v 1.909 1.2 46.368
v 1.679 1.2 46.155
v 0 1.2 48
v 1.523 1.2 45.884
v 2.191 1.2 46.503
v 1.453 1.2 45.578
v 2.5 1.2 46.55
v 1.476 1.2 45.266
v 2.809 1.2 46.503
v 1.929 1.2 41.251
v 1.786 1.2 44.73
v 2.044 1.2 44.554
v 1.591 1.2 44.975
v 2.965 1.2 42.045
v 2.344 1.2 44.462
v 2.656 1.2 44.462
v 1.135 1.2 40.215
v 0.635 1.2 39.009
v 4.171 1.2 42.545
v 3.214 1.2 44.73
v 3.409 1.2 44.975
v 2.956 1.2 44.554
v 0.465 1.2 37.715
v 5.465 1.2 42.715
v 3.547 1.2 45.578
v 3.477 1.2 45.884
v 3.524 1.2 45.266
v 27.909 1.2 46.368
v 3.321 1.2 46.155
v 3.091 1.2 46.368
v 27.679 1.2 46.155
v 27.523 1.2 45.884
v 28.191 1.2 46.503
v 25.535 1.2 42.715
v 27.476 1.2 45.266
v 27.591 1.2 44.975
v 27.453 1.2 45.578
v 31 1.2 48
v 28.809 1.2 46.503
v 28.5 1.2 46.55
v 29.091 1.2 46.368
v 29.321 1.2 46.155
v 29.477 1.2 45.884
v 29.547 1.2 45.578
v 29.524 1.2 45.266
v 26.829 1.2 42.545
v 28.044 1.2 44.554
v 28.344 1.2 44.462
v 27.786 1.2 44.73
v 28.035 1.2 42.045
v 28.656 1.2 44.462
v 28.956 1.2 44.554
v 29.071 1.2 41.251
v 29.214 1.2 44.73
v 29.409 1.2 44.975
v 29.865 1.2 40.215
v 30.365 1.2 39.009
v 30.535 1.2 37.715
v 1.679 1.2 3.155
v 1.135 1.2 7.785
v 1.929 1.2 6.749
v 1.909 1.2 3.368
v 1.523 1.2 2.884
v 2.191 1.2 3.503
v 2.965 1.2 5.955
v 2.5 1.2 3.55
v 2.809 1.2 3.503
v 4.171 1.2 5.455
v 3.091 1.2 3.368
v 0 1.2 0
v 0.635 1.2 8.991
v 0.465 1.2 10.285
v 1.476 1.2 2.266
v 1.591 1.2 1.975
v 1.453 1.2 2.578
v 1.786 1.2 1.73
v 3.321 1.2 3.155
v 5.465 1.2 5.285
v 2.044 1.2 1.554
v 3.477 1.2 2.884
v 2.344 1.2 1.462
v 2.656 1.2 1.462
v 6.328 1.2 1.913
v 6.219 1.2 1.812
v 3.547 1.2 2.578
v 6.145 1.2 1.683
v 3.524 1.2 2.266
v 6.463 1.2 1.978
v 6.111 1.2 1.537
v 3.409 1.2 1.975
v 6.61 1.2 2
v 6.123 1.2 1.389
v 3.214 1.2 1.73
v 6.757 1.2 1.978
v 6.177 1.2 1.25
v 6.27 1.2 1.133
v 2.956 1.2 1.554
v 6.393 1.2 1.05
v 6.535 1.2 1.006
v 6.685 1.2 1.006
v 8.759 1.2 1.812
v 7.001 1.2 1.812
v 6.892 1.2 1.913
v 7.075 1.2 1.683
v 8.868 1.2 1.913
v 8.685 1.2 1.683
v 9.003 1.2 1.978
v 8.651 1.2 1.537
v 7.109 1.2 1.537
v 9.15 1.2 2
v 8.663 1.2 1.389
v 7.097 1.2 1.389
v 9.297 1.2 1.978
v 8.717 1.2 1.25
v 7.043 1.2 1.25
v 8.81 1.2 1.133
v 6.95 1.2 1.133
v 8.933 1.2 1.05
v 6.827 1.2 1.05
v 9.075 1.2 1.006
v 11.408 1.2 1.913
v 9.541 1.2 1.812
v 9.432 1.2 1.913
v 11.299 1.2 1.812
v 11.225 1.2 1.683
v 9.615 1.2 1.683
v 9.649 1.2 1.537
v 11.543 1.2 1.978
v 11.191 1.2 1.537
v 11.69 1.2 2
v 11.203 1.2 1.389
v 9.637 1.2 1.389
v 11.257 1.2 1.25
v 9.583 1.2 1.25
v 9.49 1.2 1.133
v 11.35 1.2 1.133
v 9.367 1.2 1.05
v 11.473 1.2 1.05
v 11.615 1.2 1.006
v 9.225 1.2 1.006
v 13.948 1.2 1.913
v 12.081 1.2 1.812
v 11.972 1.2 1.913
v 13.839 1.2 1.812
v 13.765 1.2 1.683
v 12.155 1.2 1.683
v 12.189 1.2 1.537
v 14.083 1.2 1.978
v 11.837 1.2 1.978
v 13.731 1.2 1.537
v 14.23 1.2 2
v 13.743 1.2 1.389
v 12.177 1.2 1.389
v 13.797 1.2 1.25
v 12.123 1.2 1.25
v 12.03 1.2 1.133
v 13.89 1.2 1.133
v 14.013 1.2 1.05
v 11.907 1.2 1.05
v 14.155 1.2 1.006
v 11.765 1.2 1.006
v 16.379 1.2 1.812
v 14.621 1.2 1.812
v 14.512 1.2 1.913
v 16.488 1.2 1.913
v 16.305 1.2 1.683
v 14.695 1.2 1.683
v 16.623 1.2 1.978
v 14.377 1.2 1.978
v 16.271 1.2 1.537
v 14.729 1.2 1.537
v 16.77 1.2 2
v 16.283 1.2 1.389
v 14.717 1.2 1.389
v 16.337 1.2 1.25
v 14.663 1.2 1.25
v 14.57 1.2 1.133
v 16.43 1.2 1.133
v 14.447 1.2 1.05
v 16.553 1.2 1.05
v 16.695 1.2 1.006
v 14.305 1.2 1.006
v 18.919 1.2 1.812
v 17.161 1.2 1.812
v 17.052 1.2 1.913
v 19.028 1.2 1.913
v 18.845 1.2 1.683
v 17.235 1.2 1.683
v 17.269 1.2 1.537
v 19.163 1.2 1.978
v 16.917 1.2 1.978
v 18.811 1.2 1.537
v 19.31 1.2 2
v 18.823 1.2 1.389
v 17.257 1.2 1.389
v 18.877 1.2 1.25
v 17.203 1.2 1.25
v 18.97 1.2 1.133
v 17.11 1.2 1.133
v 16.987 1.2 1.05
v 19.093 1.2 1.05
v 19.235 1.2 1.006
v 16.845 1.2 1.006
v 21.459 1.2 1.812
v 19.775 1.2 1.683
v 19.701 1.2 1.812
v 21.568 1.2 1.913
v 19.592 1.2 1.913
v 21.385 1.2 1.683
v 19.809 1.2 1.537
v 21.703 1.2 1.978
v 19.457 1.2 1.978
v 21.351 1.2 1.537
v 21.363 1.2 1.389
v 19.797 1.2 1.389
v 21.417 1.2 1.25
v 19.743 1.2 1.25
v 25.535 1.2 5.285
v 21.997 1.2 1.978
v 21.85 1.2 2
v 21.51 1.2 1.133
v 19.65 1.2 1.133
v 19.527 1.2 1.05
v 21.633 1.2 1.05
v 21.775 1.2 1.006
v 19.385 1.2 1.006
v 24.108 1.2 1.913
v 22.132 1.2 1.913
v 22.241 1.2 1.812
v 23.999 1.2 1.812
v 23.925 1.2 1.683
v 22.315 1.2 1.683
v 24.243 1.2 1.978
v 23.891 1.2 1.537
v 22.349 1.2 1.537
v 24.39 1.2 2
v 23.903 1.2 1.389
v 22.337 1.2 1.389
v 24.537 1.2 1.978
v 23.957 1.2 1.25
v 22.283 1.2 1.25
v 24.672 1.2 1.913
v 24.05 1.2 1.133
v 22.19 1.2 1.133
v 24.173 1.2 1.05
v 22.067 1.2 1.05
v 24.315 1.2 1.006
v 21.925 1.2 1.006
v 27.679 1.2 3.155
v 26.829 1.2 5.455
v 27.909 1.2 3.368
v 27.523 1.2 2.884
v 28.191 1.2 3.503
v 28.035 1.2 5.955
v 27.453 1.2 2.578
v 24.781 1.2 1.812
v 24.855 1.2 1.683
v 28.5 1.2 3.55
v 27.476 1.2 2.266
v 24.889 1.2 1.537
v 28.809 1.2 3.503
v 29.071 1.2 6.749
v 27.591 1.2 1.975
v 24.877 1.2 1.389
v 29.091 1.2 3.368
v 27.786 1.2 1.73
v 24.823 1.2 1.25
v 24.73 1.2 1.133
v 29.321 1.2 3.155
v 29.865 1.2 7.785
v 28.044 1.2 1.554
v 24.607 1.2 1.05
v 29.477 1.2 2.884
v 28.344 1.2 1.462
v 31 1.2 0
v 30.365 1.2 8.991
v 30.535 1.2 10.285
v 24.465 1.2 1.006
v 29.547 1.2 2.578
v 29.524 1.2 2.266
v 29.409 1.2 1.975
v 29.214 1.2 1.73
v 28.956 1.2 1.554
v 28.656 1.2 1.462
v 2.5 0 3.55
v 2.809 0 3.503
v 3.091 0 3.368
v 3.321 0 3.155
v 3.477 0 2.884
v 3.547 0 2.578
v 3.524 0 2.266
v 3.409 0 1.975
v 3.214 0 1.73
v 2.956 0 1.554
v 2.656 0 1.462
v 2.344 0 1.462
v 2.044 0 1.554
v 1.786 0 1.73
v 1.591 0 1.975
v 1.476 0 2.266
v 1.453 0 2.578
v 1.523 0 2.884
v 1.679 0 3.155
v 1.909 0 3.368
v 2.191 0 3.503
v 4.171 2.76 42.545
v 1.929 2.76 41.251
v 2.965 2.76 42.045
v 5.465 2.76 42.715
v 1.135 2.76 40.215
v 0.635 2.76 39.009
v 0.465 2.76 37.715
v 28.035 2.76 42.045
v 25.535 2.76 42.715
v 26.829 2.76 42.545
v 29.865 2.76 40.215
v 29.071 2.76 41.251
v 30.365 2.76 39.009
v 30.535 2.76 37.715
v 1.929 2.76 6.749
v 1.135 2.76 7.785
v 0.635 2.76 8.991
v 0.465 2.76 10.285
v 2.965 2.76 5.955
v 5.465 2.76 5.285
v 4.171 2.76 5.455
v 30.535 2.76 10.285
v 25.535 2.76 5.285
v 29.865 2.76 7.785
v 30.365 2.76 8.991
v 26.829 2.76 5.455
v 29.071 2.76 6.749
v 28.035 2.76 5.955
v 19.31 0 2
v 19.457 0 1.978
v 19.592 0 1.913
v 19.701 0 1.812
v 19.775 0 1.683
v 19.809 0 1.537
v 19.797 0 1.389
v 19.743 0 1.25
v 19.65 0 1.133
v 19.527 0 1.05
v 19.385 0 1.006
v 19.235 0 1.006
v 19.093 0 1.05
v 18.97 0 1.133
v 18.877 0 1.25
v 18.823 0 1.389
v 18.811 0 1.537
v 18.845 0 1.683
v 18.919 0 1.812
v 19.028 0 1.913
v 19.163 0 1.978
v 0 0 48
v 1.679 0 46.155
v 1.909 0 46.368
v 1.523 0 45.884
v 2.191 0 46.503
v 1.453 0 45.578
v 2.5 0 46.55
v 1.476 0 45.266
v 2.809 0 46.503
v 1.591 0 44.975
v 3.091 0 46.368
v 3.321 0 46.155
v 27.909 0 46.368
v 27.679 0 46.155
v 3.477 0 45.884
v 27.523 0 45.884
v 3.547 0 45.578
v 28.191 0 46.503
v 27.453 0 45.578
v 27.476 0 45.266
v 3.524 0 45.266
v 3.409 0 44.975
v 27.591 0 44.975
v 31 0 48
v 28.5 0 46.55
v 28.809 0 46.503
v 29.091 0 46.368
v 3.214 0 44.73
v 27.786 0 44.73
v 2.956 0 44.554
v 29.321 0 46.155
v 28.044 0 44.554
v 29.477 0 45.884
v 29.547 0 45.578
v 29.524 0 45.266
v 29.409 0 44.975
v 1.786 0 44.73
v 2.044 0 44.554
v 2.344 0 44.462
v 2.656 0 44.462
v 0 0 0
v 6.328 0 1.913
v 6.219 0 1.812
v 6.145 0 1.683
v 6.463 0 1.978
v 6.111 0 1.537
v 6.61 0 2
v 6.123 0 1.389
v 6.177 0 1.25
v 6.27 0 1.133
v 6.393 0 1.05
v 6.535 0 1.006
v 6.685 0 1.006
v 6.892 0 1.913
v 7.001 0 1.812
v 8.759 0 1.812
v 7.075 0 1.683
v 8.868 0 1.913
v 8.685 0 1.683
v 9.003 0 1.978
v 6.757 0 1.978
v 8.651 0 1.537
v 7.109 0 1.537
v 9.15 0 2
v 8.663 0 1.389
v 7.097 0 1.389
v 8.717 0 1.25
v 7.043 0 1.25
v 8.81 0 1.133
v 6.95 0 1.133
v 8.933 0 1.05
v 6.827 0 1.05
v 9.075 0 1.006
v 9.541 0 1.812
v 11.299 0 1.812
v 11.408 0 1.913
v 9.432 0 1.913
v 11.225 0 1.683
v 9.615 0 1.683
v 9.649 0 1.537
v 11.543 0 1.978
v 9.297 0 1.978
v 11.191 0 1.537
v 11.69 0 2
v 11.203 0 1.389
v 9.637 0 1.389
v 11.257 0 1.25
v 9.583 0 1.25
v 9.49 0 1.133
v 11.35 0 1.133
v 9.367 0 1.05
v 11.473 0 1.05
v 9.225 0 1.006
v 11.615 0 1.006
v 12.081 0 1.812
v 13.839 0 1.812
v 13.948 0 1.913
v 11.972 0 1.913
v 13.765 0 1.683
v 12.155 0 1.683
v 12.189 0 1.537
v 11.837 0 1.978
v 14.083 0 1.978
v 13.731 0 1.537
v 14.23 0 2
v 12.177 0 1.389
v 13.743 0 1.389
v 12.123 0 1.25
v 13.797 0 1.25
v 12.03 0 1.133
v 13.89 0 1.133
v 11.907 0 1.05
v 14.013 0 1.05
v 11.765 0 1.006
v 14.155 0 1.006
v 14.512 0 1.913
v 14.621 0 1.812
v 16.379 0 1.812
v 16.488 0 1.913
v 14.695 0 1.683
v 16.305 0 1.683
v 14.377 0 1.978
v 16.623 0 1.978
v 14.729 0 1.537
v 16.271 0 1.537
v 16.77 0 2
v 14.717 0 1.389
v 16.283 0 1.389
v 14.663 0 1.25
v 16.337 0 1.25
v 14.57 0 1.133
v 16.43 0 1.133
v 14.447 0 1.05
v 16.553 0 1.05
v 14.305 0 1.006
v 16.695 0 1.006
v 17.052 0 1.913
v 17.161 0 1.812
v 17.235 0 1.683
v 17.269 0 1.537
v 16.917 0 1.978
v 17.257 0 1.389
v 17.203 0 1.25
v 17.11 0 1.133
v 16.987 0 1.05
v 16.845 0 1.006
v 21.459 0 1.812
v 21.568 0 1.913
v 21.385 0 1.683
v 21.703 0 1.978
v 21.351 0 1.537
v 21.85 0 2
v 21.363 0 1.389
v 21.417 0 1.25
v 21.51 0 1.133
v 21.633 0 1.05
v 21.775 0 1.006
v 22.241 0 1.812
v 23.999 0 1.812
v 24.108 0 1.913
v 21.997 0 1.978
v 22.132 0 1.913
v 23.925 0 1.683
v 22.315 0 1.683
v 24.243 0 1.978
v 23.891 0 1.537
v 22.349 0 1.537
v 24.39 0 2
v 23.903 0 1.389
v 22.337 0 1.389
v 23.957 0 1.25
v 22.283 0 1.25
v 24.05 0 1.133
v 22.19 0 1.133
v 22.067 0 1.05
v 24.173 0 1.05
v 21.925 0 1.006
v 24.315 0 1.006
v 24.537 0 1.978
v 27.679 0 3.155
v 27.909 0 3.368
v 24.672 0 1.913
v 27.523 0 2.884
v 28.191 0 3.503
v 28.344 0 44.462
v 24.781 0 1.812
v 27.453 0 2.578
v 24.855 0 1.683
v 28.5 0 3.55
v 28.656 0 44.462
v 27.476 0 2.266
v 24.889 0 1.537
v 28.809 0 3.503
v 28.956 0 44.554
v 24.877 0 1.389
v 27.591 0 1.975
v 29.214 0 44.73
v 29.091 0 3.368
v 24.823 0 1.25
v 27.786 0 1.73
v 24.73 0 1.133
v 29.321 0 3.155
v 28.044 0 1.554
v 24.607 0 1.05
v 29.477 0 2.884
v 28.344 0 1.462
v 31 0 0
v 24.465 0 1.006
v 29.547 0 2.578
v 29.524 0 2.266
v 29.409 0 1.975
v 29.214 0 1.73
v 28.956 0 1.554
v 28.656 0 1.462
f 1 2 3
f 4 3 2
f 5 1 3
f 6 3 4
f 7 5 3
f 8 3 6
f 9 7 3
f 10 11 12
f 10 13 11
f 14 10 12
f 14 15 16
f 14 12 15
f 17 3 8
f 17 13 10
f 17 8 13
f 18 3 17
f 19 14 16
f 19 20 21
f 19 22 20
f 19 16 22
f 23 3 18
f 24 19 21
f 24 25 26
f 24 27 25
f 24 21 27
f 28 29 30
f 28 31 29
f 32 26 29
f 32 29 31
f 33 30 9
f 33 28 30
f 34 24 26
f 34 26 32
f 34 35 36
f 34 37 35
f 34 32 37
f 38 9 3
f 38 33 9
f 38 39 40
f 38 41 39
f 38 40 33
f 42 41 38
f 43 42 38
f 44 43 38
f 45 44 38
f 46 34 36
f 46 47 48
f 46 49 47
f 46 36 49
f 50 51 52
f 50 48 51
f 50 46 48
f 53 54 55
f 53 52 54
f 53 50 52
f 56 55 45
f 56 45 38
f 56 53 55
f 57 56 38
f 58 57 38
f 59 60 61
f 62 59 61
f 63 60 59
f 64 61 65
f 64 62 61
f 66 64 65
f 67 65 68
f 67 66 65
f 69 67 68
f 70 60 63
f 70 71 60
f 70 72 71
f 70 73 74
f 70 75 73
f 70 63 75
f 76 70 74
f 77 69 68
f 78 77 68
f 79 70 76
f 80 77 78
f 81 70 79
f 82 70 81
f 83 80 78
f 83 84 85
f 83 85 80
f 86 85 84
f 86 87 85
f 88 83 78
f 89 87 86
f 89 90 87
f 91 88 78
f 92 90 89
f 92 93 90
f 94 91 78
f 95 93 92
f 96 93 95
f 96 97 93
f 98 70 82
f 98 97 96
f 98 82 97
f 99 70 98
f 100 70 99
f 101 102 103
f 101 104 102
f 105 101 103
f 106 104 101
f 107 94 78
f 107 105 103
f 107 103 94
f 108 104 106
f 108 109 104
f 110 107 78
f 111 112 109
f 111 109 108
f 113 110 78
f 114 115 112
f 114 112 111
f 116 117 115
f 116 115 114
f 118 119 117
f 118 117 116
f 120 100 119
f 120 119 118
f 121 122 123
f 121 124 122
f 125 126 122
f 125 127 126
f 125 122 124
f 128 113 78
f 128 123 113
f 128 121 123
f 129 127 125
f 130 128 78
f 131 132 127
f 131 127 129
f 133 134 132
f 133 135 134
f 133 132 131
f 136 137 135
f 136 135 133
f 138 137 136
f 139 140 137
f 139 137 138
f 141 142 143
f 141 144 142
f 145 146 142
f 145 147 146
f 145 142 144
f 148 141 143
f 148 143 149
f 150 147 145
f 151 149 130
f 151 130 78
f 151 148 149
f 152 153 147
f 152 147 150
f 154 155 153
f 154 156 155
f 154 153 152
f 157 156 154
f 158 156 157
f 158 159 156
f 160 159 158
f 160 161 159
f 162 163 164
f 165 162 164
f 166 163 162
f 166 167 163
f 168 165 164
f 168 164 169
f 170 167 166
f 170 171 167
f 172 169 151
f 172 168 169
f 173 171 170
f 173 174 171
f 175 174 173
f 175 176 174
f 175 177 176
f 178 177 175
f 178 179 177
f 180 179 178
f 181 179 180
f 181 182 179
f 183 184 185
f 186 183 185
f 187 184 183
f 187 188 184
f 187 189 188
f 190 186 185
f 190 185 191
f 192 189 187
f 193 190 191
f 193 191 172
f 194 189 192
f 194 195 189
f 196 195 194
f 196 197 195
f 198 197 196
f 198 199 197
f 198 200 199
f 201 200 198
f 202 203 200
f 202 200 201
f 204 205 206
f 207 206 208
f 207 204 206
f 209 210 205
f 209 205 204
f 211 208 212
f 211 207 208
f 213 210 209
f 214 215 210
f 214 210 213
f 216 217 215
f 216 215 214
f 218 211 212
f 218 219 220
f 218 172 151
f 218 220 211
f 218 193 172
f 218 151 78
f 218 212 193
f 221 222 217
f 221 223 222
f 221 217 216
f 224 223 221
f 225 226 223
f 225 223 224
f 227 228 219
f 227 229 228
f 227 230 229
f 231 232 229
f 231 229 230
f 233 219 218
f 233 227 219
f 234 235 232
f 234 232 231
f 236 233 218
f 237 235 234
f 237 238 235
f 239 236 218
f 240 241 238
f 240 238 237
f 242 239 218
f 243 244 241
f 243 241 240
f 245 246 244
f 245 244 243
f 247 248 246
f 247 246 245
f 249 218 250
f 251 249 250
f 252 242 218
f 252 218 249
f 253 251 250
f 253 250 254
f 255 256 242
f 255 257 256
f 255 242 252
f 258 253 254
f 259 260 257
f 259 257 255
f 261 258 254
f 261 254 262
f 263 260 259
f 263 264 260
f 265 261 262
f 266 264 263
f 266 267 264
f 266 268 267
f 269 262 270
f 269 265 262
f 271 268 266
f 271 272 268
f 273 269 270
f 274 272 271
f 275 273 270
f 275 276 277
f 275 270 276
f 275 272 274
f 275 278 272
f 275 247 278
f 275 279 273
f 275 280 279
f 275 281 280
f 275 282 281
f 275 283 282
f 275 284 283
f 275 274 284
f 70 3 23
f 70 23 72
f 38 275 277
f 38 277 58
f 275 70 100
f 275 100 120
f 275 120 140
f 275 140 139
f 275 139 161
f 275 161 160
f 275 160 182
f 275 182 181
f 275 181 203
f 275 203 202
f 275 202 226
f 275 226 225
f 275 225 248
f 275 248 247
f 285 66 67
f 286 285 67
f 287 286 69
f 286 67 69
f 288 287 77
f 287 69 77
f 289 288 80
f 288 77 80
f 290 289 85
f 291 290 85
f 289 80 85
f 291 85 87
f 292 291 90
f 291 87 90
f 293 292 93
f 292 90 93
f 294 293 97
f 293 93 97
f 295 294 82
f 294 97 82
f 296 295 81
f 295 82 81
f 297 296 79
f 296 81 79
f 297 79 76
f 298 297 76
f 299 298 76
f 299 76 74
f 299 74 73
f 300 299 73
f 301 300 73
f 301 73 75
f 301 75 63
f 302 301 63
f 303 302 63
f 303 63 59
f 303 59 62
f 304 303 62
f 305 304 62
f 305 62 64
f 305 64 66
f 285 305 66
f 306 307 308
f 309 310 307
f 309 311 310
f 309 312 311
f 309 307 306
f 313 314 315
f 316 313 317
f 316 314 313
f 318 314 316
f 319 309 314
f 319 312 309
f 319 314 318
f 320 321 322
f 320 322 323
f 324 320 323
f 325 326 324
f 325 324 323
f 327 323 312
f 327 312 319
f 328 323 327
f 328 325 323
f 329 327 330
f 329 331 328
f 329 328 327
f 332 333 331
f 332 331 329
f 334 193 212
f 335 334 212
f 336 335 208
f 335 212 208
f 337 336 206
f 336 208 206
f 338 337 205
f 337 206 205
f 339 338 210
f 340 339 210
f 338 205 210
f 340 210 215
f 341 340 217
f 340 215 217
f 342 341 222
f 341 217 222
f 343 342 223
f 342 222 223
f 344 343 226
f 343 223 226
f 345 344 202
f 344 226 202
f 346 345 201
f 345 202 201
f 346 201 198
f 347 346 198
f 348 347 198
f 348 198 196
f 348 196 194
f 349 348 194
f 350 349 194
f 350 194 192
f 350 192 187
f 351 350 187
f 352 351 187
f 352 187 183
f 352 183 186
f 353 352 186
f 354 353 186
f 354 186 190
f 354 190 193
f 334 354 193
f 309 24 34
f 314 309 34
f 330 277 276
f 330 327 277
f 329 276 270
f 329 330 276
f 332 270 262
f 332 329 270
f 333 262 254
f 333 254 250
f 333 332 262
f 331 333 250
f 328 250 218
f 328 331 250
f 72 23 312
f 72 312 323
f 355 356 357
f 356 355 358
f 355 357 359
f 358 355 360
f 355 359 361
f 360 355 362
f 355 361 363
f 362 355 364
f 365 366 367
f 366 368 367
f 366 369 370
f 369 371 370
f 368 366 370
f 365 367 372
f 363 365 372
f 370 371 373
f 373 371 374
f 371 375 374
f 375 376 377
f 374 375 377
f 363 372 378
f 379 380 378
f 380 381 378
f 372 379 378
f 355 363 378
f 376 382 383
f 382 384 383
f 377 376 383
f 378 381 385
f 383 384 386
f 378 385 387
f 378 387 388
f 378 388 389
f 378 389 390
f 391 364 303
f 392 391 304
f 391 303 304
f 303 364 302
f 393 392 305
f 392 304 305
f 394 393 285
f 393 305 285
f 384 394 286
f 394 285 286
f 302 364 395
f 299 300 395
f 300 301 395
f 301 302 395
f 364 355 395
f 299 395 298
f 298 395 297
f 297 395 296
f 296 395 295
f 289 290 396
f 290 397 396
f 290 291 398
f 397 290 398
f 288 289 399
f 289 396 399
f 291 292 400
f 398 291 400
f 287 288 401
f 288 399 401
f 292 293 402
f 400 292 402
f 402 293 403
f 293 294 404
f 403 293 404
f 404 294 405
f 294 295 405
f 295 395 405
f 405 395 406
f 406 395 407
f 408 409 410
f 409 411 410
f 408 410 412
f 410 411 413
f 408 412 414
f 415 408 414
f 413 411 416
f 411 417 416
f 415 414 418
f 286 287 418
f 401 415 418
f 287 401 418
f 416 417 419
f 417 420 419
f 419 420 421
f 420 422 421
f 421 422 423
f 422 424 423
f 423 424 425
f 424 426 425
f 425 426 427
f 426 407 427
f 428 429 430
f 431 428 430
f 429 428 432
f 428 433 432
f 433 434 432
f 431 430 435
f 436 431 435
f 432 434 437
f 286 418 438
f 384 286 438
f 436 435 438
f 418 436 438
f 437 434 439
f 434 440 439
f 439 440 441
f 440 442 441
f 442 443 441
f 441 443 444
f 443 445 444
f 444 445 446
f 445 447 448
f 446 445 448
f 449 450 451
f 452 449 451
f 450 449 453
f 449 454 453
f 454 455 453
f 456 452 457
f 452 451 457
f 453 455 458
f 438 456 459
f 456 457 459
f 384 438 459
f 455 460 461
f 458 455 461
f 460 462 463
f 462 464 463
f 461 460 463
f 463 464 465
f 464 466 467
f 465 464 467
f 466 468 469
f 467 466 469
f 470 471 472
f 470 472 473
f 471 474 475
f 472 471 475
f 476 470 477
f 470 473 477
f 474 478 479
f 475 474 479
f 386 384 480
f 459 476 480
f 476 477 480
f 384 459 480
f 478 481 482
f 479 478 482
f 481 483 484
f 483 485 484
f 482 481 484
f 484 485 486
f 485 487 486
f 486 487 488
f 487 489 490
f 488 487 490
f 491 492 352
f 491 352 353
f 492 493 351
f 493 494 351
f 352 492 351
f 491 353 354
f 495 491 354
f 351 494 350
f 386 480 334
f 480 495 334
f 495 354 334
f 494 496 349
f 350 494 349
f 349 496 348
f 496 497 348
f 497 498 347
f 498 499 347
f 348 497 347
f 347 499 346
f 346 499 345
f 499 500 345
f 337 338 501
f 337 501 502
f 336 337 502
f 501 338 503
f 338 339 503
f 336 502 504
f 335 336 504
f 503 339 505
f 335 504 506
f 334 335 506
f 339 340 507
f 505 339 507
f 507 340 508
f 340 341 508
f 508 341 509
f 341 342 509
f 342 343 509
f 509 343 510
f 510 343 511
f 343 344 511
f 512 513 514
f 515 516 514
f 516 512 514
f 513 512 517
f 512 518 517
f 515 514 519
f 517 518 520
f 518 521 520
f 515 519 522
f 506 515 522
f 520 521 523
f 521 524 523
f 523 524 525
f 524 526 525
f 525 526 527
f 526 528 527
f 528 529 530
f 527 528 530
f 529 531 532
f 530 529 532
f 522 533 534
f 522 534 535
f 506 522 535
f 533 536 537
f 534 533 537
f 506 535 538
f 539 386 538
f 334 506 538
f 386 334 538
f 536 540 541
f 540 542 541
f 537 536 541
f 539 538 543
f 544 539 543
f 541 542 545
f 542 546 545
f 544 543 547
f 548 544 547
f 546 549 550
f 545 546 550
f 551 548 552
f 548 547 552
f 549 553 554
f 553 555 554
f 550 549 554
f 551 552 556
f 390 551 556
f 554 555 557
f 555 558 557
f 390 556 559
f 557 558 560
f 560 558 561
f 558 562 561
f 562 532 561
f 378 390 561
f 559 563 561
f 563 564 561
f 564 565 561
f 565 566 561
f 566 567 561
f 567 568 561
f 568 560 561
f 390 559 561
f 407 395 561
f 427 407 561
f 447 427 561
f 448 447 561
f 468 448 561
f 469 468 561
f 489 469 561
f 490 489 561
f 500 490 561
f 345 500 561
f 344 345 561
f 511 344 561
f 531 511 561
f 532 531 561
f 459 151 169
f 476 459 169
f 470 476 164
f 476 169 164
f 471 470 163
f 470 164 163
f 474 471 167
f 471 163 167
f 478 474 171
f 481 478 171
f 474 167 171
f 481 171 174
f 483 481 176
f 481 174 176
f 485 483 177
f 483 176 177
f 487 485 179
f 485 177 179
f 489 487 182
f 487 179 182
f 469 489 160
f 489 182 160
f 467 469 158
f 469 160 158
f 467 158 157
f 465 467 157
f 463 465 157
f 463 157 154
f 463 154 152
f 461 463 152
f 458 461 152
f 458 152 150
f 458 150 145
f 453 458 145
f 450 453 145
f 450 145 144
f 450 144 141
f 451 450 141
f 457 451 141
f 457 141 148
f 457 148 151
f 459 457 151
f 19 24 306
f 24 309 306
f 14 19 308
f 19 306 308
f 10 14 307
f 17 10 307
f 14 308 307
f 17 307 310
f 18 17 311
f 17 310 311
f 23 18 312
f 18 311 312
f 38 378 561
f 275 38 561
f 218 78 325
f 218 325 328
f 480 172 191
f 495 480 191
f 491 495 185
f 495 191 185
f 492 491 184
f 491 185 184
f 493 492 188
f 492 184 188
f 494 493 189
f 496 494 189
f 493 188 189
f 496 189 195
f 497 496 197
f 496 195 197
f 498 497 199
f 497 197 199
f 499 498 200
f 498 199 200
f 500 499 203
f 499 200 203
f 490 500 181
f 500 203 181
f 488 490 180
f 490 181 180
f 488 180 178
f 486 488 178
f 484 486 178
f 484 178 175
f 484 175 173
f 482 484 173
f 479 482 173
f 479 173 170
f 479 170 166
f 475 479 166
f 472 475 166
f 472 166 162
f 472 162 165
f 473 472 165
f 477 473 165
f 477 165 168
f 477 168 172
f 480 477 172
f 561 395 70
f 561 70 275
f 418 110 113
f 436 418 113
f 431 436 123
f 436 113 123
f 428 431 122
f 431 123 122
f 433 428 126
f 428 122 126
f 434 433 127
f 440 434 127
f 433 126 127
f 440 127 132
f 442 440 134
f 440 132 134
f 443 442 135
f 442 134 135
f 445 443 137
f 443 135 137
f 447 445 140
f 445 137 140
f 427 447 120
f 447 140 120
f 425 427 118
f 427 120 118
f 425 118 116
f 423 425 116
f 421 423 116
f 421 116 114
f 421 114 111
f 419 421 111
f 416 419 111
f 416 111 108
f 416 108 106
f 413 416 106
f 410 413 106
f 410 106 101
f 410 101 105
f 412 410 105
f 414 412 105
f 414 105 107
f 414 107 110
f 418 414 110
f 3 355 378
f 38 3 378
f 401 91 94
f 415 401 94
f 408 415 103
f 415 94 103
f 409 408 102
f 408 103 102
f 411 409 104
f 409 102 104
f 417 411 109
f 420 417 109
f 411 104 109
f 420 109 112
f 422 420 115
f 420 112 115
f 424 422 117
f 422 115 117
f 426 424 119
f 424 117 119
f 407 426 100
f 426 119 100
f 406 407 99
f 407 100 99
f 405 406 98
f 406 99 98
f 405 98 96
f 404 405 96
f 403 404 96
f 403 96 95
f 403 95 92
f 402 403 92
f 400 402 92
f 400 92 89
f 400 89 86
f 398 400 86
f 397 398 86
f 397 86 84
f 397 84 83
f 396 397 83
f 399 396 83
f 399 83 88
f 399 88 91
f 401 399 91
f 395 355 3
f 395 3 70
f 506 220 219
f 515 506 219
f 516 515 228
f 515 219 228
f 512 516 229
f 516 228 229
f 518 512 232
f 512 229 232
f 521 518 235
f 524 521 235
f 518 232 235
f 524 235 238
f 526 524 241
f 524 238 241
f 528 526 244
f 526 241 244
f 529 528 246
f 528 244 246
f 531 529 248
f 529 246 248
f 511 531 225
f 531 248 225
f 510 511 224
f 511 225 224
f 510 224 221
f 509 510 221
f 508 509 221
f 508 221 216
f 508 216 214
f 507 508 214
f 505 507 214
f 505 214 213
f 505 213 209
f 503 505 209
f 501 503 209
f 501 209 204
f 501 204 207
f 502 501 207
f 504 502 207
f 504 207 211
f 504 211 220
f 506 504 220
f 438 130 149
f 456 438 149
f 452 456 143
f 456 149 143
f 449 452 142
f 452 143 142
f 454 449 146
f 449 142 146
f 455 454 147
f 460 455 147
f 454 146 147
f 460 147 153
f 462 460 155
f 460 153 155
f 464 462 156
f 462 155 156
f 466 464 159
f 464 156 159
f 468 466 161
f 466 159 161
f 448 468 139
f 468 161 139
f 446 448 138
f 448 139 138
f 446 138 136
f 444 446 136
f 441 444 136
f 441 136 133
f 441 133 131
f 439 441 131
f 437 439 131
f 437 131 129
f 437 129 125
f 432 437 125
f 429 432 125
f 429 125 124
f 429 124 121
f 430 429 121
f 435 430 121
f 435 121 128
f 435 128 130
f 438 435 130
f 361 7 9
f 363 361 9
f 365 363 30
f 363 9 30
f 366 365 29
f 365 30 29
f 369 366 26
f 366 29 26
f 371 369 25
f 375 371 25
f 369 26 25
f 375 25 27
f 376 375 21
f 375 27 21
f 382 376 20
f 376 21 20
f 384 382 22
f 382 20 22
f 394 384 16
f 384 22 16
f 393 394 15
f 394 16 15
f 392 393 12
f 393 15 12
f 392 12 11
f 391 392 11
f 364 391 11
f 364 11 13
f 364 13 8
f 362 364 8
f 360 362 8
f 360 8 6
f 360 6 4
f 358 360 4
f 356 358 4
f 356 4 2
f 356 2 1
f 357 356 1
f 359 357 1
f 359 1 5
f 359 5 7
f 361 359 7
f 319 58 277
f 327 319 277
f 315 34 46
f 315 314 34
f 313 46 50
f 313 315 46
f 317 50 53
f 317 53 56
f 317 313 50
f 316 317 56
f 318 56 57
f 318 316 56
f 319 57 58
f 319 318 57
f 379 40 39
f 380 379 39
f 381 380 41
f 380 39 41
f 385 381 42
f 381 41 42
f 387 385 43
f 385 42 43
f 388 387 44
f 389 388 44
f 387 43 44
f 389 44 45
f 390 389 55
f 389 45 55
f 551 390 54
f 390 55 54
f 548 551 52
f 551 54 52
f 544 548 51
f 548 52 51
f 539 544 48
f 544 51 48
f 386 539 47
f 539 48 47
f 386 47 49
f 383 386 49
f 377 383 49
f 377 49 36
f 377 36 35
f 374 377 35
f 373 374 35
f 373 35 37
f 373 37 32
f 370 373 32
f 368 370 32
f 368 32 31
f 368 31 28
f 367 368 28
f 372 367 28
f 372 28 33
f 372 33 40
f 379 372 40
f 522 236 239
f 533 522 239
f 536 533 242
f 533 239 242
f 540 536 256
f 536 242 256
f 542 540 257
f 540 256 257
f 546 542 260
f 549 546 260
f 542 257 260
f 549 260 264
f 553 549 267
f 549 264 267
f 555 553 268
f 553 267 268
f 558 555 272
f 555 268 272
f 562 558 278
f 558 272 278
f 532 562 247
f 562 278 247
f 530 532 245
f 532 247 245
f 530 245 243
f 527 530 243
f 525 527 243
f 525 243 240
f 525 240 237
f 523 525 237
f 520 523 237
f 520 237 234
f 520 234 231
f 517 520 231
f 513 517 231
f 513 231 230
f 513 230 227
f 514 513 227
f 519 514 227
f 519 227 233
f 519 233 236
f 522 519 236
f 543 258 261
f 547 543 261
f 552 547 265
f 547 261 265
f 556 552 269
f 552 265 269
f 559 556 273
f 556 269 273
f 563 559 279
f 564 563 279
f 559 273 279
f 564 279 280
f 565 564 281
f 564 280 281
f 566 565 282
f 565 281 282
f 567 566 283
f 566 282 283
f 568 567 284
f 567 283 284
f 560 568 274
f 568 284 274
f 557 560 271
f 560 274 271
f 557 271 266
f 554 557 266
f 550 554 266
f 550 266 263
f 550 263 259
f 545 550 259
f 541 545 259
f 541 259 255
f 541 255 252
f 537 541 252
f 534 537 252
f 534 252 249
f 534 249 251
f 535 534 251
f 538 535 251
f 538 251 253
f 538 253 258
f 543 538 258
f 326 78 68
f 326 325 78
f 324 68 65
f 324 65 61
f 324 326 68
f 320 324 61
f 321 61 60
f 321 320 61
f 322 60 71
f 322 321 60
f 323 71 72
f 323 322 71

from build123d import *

# Parameters (mm, degrees)
SKETCH_1_W          = 31
SKETCH_1_H          = 48
EXTRUDE_1_DEPTH     = 1.2
CUT_EXTRUDE_1_REACH = 59.153
SKETCH_2_R          = 1.05
CUT_EXTRUDE_2_REACH = 59.153
SKETCH_3_R          = 0.5
SKETCH_4_W          = 30.07
SKETCH_4_H          = 37.43
EXTRUDE_2_DEPTH     = 1.56
FILLET_1_R          = 5


with BuildPart() as part:
    # 草图1 → 凸台-拉伸1 (new body)
    with BuildSketch(Plane(origin=(0, 0, 0), x_dir=(1, 0, 0), z_dir=(0, 1, 0))):
        with Locations((15.5, -24)):
            Rectangle(SKETCH_1_W, SKETCH_1_H)
    extrude(amount=EXTRUDE_1_DEPTH)

    # 草图2 → 切除-拉伸1 (cut, up to next)
    with BuildSketch(Plane(origin=(0, 1.2, 0), x_dir=(1, 0, 0), z_dir=(0, 1, 0)), mode=Mode.PRIVATE) as cut_extrude_1_sk1:
        with Locations(Location((2.5, -2.5, 0), (0, 0, 270))):
            Circle(SKETCH_2_R)
    cut_extrude_1_tool1 = extrude(cut_extrude_1_sk1.sketch, amount=-CUT_EXTRUDE_1_REACH, mode=Mode.PRIVATE) & part.part
    # 草图2 → 切除-拉伸1 (cut, up to next)
    with BuildSketch(Plane(origin=(0, 1.2, 0), x_dir=(1, 0, 0), z_dir=(0, 1, 0)), mode=Mode.PRIVATE) as cut_extrude_1_sk2:
        with Locations(Location((28.5, -2.5, 0), (0, 0, 270))):
            Circle(SKETCH_2_R)
    cut_extrude_1_tool2 = extrude(cut_extrude_1_sk2.sketch, amount=-CUT_EXTRUDE_1_REACH, mode=Mode.PRIVATE) & part.part
    # 草图2 → 切除-拉伸1 (cut, up to next)
    with BuildSketch(Plane(origin=(0, 1.2, 0), x_dir=(1, 0, 0), z_dir=(0, 1, 0)), mode=Mode.PRIVATE) as cut_extrude_1_sk3:
        with Locations(Location((2.5, -45.5, 0), (0, 0, 270))):
            Circle(SKETCH_2_R)
    cut_extrude_1_tool3 = extrude(cut_extrude_1_sk3.sketch, amount=-CUT_EXTRUDE_1_REACH, mode=Mode.PRIVATE) & part.part
    # 草图2 → 切除-拉伸1 (cut, up to next)
    with BuildSketch(Plane(origin=(0, 1.2, 0), x_dir=(1, 0, 0), z_dir=(0, 1, 0)), mode=Mode.PRIVATE) as cut_extrude_1_sk4:
        with Locations(Location((28.5, -45.5, 0), (0, 0, 270))):
            Circle(SKETCH_2_R)
    cut_extrude_1_tool4 = extrude(cut_extrude_1_sk4.sketch, amount=-CUT_EXTRUDE_1_REACH, mode=Mode.PRIVATE) & part.part
    add(cut_extrude_1_tool1.solids().sort_by_distance((2.5, 1.2, 2.5))[0], mode=Mode.SUBTRACT)
    add(cut_extrude_1_tool2.solids().sort_by_distance((28.5, 1.2, 2.5))[0], mode=Mode.SUBTRACT)
    add(cut_extrude_1_tool3.solids().sort_by_distance((2.5, 1.2, 45.5))[0], mode=Mode.SUBTRACT)
    add(cut_extrude_1_tool4.solids().sort_by_distance((28.5, 1.2, 45.5))[0], mode=Mode.SUBTRACT)

    # 草图3 → 切除-拉伸2 (cut, up to next)
    with BuildSketch(Plane(origin=(0, 1.2, 0), x_dir=(1, 0, 0), z_dir=(0, 1, 0)), mode=Mode.PRIVATE) as cut_extrude_2_sk1:
        with Locations(Location((14.23, -1.5, 0), (0, 0, 270))):
            Circle(SKETCH_3_R)
    cut_extrude_2_tool1 = extrude(cut_extrude_2_sk1.sketch, amount=-CUT_EXTRUDE_2_REACH, mode=Mode.PRIVATE) & part.part
    # 草图3 → 切除-拉伸2 (cut, up to next)
    with BuildSketch(Plane(origin=(0, 1.2, 0), x_dir=(1, 0, 0), z_dir=(0, 1, 0)), mode=Mode.PRIVATE) as cut_extrude_2_sk2:
        with Locations(Location((11.69, -1.5, 0), (0, 0, 270))):
            Circle(SKETCH_3_R)
    cut_extrude_2_tool2 = extrude(cut_extrude_2_sk2.sketch, amount=-CUT_EXTRUDE_2_REACH, mode=Mode.PRIVATE) & part.part
    # 草图3 → 切除-拉伸2 (cut, up to next)
    with BuildSketch(Plane(origin=(0, 1.2, 0), x_dir=(1, 0, 0), z_dir=(0, 1, 0)), mode=Mode.PRIVATE) as cut_extrude_2_sk3:
        with Locations(Location((9.15, -1.5, 0), (0, 0, 270))):
            Circle(SKETCH_3_R)
    cut_extrude_2_tool3 = extrude(cut_extrude_2_sk3.sketch, amount=-CUT_EXTRUDE_2_REACH, mode=Mode.PRIVATE) & part.part
    # 草图3 → 切除-拉伸2 (cut, up to next)
    with BuildSketch(Plane(origin=(0, 1.2, 0), x_dir=(1, 0, 0), z_dir=(0, 1, 0)), mode=Mode.PRIVATE) as cut_extrude_2_sk4:
        with Locations(Location((6.61, -1.5, 0), (0, 0, 270))):
            Circle(SKETCH_3_R)
    cut_extrude_2_tool4 = extrude(cut_extrude_2_sk4.sketch, amount=-CUT_EXTRUDE_2_REACH, mode=Mode.PRIVATE) & part.part
    # 草图3 → 切除-拉伸2 (cut, up to next)
    with BuildSketch(Plane(origin=(0, 1.2, 0), x_dir=(1, 0, 0), z_dir=(0, 1, 0)), mode=Mode.PRIVATE) as cut_extrude_2_sk5:
        with Locations(Location((24.39, -1.5, 0), (0, 0, 270))):
            Circle(SKETCH_3_R)
    cut_extrude_2_tool5 = extrude(cut_extrude_2_sk5.sketch, amount=-CUT_EXTRUDE_2_REACH, mode=Mode.PRIVATE) & part.part
    # 草图3 → 切除-拉伸2 (cut, up to next)
    with BuildSketch(Plane(origin=(0, 1.2, 0), x_dir=(1, 0, 0), z_dir=(0, 1, 0)), mode=Mode.PRIVATE) as cut_extrude_2_sk6:
        with Locations(Location((21.85, -1.5, 0), (0, 0, 270))):
            Circle(SKETCH_3_R)
    cut_extrude_2_tool6 = extrude(cut_extrude_2_sk6.sketch, amount=-CUT_EXTRUDE_2_REACH, mode=Mode.PRIVATE) & part.part
    # 草图3 → 切除-拉伸2 (cut, up to next)
    with BuildSketch(Plane(origin=(0, 1.2, 0), x_dir=(1, 0, 0), z_dir=(0, 1, 0)), mode=Mode.PRIVATE) as cut_extrude_2_sk7:
        with Locations(Location((19.31, -1.5, 0), (0, 0, 270))):
            Circle(SKETCH_3_R)
    cut_extrude_2_tool7 = extrude(cut_extrude_2_sk7.sketch, amount=-CUT_EXTRUDE_2_REACH, mode=Mode.PRIVATE) & part.part
    # 草图3 → 切除-拉伸2 (cut, up to next)
    with BuildSketch(Plane(origin=(0, 1.2, 0), x_dir=(1, 0, 0), z_dir=(0, 1, 0)), mode=Mode.PRIVATE) as cut_extrude_2_sk8:
        with Locations(Location((16.77, -1.5, 0), (0, 0, 270))):
            Circle(SKETCH_3_R)
    cut_extrude_2_tool8 = extrude(cut_extrude_2_sk8.sketch, amount=-CUT_EXTRUDE_2_REACH, mode=Mode.PRIVATE) & part.part
    add(cut_extrude_2_tool1.solids().sort_by_distance((14.23, 1.2, 1.5))[0], mode=Mode.SUBTRACT)
    add(cut_extrude_2_tool2.solids().sort_by_distance((11.69, 1.2, 1.5))[0], mode=Mode.SUBTRACT)
    add(cut_extrude_2_tool3.solids().sort_by_distance((9.15, 1.2, 1.5))[0], mode=Mode.SUBTRACT)
    add(cut_extrude_2_tool4.solids().sort_by_distance((6.61, 1.2, 1.5))[0], mode=Mode.SUBTRACT)
    add(cut_extrude_2_tool5.solids().sort_by_distance((24.39, 1.2, 1.5))[0], mode=Mode.SUBTRACT)
    add(cut_extrude_2_tool6.solids().sort_by_distance((21.85, 1.2, 1.5))[0], mode=Mode.SUBTRACT)
    add(cut_extrude_2_tool7.solids().sort_by_distance((19.31, 1.2, 1.5))[0], mode=Mode.SUBTRACT)
    add(cut_extrude_2_tool8.solids().sort_by_distance((16.77, 1.2, 1.5))[0], mode=Mode.SUBTRACT)

    # 草图4 → 凸台-拉伸2 (add)
    with BuildSketch(Plane(origin=(0, 1.2, 0), x_dir=(1, 0, 0), z_dir=(0, 1, 0))):
        with Locations((15.5, -24)):
            Rectangle(SKETCH_4_W, SKETCH_4_H)
    extrude(amount=EXTRUDE_2_DEPTH)

    # 圆角1
    fillet_1_edges = [part.edges().sort_by_distance(p)[0] for p in [
        (0.465, 1.98, 5.285),
        (0.465, 1.98, 42.715),
        (30.535, 1.98, 42.715),
        (30.535, 1.98, 5.285),
    ]]
    fillet(fillet_1_edges, radius=FILLET_1_R)


solid = part.part
